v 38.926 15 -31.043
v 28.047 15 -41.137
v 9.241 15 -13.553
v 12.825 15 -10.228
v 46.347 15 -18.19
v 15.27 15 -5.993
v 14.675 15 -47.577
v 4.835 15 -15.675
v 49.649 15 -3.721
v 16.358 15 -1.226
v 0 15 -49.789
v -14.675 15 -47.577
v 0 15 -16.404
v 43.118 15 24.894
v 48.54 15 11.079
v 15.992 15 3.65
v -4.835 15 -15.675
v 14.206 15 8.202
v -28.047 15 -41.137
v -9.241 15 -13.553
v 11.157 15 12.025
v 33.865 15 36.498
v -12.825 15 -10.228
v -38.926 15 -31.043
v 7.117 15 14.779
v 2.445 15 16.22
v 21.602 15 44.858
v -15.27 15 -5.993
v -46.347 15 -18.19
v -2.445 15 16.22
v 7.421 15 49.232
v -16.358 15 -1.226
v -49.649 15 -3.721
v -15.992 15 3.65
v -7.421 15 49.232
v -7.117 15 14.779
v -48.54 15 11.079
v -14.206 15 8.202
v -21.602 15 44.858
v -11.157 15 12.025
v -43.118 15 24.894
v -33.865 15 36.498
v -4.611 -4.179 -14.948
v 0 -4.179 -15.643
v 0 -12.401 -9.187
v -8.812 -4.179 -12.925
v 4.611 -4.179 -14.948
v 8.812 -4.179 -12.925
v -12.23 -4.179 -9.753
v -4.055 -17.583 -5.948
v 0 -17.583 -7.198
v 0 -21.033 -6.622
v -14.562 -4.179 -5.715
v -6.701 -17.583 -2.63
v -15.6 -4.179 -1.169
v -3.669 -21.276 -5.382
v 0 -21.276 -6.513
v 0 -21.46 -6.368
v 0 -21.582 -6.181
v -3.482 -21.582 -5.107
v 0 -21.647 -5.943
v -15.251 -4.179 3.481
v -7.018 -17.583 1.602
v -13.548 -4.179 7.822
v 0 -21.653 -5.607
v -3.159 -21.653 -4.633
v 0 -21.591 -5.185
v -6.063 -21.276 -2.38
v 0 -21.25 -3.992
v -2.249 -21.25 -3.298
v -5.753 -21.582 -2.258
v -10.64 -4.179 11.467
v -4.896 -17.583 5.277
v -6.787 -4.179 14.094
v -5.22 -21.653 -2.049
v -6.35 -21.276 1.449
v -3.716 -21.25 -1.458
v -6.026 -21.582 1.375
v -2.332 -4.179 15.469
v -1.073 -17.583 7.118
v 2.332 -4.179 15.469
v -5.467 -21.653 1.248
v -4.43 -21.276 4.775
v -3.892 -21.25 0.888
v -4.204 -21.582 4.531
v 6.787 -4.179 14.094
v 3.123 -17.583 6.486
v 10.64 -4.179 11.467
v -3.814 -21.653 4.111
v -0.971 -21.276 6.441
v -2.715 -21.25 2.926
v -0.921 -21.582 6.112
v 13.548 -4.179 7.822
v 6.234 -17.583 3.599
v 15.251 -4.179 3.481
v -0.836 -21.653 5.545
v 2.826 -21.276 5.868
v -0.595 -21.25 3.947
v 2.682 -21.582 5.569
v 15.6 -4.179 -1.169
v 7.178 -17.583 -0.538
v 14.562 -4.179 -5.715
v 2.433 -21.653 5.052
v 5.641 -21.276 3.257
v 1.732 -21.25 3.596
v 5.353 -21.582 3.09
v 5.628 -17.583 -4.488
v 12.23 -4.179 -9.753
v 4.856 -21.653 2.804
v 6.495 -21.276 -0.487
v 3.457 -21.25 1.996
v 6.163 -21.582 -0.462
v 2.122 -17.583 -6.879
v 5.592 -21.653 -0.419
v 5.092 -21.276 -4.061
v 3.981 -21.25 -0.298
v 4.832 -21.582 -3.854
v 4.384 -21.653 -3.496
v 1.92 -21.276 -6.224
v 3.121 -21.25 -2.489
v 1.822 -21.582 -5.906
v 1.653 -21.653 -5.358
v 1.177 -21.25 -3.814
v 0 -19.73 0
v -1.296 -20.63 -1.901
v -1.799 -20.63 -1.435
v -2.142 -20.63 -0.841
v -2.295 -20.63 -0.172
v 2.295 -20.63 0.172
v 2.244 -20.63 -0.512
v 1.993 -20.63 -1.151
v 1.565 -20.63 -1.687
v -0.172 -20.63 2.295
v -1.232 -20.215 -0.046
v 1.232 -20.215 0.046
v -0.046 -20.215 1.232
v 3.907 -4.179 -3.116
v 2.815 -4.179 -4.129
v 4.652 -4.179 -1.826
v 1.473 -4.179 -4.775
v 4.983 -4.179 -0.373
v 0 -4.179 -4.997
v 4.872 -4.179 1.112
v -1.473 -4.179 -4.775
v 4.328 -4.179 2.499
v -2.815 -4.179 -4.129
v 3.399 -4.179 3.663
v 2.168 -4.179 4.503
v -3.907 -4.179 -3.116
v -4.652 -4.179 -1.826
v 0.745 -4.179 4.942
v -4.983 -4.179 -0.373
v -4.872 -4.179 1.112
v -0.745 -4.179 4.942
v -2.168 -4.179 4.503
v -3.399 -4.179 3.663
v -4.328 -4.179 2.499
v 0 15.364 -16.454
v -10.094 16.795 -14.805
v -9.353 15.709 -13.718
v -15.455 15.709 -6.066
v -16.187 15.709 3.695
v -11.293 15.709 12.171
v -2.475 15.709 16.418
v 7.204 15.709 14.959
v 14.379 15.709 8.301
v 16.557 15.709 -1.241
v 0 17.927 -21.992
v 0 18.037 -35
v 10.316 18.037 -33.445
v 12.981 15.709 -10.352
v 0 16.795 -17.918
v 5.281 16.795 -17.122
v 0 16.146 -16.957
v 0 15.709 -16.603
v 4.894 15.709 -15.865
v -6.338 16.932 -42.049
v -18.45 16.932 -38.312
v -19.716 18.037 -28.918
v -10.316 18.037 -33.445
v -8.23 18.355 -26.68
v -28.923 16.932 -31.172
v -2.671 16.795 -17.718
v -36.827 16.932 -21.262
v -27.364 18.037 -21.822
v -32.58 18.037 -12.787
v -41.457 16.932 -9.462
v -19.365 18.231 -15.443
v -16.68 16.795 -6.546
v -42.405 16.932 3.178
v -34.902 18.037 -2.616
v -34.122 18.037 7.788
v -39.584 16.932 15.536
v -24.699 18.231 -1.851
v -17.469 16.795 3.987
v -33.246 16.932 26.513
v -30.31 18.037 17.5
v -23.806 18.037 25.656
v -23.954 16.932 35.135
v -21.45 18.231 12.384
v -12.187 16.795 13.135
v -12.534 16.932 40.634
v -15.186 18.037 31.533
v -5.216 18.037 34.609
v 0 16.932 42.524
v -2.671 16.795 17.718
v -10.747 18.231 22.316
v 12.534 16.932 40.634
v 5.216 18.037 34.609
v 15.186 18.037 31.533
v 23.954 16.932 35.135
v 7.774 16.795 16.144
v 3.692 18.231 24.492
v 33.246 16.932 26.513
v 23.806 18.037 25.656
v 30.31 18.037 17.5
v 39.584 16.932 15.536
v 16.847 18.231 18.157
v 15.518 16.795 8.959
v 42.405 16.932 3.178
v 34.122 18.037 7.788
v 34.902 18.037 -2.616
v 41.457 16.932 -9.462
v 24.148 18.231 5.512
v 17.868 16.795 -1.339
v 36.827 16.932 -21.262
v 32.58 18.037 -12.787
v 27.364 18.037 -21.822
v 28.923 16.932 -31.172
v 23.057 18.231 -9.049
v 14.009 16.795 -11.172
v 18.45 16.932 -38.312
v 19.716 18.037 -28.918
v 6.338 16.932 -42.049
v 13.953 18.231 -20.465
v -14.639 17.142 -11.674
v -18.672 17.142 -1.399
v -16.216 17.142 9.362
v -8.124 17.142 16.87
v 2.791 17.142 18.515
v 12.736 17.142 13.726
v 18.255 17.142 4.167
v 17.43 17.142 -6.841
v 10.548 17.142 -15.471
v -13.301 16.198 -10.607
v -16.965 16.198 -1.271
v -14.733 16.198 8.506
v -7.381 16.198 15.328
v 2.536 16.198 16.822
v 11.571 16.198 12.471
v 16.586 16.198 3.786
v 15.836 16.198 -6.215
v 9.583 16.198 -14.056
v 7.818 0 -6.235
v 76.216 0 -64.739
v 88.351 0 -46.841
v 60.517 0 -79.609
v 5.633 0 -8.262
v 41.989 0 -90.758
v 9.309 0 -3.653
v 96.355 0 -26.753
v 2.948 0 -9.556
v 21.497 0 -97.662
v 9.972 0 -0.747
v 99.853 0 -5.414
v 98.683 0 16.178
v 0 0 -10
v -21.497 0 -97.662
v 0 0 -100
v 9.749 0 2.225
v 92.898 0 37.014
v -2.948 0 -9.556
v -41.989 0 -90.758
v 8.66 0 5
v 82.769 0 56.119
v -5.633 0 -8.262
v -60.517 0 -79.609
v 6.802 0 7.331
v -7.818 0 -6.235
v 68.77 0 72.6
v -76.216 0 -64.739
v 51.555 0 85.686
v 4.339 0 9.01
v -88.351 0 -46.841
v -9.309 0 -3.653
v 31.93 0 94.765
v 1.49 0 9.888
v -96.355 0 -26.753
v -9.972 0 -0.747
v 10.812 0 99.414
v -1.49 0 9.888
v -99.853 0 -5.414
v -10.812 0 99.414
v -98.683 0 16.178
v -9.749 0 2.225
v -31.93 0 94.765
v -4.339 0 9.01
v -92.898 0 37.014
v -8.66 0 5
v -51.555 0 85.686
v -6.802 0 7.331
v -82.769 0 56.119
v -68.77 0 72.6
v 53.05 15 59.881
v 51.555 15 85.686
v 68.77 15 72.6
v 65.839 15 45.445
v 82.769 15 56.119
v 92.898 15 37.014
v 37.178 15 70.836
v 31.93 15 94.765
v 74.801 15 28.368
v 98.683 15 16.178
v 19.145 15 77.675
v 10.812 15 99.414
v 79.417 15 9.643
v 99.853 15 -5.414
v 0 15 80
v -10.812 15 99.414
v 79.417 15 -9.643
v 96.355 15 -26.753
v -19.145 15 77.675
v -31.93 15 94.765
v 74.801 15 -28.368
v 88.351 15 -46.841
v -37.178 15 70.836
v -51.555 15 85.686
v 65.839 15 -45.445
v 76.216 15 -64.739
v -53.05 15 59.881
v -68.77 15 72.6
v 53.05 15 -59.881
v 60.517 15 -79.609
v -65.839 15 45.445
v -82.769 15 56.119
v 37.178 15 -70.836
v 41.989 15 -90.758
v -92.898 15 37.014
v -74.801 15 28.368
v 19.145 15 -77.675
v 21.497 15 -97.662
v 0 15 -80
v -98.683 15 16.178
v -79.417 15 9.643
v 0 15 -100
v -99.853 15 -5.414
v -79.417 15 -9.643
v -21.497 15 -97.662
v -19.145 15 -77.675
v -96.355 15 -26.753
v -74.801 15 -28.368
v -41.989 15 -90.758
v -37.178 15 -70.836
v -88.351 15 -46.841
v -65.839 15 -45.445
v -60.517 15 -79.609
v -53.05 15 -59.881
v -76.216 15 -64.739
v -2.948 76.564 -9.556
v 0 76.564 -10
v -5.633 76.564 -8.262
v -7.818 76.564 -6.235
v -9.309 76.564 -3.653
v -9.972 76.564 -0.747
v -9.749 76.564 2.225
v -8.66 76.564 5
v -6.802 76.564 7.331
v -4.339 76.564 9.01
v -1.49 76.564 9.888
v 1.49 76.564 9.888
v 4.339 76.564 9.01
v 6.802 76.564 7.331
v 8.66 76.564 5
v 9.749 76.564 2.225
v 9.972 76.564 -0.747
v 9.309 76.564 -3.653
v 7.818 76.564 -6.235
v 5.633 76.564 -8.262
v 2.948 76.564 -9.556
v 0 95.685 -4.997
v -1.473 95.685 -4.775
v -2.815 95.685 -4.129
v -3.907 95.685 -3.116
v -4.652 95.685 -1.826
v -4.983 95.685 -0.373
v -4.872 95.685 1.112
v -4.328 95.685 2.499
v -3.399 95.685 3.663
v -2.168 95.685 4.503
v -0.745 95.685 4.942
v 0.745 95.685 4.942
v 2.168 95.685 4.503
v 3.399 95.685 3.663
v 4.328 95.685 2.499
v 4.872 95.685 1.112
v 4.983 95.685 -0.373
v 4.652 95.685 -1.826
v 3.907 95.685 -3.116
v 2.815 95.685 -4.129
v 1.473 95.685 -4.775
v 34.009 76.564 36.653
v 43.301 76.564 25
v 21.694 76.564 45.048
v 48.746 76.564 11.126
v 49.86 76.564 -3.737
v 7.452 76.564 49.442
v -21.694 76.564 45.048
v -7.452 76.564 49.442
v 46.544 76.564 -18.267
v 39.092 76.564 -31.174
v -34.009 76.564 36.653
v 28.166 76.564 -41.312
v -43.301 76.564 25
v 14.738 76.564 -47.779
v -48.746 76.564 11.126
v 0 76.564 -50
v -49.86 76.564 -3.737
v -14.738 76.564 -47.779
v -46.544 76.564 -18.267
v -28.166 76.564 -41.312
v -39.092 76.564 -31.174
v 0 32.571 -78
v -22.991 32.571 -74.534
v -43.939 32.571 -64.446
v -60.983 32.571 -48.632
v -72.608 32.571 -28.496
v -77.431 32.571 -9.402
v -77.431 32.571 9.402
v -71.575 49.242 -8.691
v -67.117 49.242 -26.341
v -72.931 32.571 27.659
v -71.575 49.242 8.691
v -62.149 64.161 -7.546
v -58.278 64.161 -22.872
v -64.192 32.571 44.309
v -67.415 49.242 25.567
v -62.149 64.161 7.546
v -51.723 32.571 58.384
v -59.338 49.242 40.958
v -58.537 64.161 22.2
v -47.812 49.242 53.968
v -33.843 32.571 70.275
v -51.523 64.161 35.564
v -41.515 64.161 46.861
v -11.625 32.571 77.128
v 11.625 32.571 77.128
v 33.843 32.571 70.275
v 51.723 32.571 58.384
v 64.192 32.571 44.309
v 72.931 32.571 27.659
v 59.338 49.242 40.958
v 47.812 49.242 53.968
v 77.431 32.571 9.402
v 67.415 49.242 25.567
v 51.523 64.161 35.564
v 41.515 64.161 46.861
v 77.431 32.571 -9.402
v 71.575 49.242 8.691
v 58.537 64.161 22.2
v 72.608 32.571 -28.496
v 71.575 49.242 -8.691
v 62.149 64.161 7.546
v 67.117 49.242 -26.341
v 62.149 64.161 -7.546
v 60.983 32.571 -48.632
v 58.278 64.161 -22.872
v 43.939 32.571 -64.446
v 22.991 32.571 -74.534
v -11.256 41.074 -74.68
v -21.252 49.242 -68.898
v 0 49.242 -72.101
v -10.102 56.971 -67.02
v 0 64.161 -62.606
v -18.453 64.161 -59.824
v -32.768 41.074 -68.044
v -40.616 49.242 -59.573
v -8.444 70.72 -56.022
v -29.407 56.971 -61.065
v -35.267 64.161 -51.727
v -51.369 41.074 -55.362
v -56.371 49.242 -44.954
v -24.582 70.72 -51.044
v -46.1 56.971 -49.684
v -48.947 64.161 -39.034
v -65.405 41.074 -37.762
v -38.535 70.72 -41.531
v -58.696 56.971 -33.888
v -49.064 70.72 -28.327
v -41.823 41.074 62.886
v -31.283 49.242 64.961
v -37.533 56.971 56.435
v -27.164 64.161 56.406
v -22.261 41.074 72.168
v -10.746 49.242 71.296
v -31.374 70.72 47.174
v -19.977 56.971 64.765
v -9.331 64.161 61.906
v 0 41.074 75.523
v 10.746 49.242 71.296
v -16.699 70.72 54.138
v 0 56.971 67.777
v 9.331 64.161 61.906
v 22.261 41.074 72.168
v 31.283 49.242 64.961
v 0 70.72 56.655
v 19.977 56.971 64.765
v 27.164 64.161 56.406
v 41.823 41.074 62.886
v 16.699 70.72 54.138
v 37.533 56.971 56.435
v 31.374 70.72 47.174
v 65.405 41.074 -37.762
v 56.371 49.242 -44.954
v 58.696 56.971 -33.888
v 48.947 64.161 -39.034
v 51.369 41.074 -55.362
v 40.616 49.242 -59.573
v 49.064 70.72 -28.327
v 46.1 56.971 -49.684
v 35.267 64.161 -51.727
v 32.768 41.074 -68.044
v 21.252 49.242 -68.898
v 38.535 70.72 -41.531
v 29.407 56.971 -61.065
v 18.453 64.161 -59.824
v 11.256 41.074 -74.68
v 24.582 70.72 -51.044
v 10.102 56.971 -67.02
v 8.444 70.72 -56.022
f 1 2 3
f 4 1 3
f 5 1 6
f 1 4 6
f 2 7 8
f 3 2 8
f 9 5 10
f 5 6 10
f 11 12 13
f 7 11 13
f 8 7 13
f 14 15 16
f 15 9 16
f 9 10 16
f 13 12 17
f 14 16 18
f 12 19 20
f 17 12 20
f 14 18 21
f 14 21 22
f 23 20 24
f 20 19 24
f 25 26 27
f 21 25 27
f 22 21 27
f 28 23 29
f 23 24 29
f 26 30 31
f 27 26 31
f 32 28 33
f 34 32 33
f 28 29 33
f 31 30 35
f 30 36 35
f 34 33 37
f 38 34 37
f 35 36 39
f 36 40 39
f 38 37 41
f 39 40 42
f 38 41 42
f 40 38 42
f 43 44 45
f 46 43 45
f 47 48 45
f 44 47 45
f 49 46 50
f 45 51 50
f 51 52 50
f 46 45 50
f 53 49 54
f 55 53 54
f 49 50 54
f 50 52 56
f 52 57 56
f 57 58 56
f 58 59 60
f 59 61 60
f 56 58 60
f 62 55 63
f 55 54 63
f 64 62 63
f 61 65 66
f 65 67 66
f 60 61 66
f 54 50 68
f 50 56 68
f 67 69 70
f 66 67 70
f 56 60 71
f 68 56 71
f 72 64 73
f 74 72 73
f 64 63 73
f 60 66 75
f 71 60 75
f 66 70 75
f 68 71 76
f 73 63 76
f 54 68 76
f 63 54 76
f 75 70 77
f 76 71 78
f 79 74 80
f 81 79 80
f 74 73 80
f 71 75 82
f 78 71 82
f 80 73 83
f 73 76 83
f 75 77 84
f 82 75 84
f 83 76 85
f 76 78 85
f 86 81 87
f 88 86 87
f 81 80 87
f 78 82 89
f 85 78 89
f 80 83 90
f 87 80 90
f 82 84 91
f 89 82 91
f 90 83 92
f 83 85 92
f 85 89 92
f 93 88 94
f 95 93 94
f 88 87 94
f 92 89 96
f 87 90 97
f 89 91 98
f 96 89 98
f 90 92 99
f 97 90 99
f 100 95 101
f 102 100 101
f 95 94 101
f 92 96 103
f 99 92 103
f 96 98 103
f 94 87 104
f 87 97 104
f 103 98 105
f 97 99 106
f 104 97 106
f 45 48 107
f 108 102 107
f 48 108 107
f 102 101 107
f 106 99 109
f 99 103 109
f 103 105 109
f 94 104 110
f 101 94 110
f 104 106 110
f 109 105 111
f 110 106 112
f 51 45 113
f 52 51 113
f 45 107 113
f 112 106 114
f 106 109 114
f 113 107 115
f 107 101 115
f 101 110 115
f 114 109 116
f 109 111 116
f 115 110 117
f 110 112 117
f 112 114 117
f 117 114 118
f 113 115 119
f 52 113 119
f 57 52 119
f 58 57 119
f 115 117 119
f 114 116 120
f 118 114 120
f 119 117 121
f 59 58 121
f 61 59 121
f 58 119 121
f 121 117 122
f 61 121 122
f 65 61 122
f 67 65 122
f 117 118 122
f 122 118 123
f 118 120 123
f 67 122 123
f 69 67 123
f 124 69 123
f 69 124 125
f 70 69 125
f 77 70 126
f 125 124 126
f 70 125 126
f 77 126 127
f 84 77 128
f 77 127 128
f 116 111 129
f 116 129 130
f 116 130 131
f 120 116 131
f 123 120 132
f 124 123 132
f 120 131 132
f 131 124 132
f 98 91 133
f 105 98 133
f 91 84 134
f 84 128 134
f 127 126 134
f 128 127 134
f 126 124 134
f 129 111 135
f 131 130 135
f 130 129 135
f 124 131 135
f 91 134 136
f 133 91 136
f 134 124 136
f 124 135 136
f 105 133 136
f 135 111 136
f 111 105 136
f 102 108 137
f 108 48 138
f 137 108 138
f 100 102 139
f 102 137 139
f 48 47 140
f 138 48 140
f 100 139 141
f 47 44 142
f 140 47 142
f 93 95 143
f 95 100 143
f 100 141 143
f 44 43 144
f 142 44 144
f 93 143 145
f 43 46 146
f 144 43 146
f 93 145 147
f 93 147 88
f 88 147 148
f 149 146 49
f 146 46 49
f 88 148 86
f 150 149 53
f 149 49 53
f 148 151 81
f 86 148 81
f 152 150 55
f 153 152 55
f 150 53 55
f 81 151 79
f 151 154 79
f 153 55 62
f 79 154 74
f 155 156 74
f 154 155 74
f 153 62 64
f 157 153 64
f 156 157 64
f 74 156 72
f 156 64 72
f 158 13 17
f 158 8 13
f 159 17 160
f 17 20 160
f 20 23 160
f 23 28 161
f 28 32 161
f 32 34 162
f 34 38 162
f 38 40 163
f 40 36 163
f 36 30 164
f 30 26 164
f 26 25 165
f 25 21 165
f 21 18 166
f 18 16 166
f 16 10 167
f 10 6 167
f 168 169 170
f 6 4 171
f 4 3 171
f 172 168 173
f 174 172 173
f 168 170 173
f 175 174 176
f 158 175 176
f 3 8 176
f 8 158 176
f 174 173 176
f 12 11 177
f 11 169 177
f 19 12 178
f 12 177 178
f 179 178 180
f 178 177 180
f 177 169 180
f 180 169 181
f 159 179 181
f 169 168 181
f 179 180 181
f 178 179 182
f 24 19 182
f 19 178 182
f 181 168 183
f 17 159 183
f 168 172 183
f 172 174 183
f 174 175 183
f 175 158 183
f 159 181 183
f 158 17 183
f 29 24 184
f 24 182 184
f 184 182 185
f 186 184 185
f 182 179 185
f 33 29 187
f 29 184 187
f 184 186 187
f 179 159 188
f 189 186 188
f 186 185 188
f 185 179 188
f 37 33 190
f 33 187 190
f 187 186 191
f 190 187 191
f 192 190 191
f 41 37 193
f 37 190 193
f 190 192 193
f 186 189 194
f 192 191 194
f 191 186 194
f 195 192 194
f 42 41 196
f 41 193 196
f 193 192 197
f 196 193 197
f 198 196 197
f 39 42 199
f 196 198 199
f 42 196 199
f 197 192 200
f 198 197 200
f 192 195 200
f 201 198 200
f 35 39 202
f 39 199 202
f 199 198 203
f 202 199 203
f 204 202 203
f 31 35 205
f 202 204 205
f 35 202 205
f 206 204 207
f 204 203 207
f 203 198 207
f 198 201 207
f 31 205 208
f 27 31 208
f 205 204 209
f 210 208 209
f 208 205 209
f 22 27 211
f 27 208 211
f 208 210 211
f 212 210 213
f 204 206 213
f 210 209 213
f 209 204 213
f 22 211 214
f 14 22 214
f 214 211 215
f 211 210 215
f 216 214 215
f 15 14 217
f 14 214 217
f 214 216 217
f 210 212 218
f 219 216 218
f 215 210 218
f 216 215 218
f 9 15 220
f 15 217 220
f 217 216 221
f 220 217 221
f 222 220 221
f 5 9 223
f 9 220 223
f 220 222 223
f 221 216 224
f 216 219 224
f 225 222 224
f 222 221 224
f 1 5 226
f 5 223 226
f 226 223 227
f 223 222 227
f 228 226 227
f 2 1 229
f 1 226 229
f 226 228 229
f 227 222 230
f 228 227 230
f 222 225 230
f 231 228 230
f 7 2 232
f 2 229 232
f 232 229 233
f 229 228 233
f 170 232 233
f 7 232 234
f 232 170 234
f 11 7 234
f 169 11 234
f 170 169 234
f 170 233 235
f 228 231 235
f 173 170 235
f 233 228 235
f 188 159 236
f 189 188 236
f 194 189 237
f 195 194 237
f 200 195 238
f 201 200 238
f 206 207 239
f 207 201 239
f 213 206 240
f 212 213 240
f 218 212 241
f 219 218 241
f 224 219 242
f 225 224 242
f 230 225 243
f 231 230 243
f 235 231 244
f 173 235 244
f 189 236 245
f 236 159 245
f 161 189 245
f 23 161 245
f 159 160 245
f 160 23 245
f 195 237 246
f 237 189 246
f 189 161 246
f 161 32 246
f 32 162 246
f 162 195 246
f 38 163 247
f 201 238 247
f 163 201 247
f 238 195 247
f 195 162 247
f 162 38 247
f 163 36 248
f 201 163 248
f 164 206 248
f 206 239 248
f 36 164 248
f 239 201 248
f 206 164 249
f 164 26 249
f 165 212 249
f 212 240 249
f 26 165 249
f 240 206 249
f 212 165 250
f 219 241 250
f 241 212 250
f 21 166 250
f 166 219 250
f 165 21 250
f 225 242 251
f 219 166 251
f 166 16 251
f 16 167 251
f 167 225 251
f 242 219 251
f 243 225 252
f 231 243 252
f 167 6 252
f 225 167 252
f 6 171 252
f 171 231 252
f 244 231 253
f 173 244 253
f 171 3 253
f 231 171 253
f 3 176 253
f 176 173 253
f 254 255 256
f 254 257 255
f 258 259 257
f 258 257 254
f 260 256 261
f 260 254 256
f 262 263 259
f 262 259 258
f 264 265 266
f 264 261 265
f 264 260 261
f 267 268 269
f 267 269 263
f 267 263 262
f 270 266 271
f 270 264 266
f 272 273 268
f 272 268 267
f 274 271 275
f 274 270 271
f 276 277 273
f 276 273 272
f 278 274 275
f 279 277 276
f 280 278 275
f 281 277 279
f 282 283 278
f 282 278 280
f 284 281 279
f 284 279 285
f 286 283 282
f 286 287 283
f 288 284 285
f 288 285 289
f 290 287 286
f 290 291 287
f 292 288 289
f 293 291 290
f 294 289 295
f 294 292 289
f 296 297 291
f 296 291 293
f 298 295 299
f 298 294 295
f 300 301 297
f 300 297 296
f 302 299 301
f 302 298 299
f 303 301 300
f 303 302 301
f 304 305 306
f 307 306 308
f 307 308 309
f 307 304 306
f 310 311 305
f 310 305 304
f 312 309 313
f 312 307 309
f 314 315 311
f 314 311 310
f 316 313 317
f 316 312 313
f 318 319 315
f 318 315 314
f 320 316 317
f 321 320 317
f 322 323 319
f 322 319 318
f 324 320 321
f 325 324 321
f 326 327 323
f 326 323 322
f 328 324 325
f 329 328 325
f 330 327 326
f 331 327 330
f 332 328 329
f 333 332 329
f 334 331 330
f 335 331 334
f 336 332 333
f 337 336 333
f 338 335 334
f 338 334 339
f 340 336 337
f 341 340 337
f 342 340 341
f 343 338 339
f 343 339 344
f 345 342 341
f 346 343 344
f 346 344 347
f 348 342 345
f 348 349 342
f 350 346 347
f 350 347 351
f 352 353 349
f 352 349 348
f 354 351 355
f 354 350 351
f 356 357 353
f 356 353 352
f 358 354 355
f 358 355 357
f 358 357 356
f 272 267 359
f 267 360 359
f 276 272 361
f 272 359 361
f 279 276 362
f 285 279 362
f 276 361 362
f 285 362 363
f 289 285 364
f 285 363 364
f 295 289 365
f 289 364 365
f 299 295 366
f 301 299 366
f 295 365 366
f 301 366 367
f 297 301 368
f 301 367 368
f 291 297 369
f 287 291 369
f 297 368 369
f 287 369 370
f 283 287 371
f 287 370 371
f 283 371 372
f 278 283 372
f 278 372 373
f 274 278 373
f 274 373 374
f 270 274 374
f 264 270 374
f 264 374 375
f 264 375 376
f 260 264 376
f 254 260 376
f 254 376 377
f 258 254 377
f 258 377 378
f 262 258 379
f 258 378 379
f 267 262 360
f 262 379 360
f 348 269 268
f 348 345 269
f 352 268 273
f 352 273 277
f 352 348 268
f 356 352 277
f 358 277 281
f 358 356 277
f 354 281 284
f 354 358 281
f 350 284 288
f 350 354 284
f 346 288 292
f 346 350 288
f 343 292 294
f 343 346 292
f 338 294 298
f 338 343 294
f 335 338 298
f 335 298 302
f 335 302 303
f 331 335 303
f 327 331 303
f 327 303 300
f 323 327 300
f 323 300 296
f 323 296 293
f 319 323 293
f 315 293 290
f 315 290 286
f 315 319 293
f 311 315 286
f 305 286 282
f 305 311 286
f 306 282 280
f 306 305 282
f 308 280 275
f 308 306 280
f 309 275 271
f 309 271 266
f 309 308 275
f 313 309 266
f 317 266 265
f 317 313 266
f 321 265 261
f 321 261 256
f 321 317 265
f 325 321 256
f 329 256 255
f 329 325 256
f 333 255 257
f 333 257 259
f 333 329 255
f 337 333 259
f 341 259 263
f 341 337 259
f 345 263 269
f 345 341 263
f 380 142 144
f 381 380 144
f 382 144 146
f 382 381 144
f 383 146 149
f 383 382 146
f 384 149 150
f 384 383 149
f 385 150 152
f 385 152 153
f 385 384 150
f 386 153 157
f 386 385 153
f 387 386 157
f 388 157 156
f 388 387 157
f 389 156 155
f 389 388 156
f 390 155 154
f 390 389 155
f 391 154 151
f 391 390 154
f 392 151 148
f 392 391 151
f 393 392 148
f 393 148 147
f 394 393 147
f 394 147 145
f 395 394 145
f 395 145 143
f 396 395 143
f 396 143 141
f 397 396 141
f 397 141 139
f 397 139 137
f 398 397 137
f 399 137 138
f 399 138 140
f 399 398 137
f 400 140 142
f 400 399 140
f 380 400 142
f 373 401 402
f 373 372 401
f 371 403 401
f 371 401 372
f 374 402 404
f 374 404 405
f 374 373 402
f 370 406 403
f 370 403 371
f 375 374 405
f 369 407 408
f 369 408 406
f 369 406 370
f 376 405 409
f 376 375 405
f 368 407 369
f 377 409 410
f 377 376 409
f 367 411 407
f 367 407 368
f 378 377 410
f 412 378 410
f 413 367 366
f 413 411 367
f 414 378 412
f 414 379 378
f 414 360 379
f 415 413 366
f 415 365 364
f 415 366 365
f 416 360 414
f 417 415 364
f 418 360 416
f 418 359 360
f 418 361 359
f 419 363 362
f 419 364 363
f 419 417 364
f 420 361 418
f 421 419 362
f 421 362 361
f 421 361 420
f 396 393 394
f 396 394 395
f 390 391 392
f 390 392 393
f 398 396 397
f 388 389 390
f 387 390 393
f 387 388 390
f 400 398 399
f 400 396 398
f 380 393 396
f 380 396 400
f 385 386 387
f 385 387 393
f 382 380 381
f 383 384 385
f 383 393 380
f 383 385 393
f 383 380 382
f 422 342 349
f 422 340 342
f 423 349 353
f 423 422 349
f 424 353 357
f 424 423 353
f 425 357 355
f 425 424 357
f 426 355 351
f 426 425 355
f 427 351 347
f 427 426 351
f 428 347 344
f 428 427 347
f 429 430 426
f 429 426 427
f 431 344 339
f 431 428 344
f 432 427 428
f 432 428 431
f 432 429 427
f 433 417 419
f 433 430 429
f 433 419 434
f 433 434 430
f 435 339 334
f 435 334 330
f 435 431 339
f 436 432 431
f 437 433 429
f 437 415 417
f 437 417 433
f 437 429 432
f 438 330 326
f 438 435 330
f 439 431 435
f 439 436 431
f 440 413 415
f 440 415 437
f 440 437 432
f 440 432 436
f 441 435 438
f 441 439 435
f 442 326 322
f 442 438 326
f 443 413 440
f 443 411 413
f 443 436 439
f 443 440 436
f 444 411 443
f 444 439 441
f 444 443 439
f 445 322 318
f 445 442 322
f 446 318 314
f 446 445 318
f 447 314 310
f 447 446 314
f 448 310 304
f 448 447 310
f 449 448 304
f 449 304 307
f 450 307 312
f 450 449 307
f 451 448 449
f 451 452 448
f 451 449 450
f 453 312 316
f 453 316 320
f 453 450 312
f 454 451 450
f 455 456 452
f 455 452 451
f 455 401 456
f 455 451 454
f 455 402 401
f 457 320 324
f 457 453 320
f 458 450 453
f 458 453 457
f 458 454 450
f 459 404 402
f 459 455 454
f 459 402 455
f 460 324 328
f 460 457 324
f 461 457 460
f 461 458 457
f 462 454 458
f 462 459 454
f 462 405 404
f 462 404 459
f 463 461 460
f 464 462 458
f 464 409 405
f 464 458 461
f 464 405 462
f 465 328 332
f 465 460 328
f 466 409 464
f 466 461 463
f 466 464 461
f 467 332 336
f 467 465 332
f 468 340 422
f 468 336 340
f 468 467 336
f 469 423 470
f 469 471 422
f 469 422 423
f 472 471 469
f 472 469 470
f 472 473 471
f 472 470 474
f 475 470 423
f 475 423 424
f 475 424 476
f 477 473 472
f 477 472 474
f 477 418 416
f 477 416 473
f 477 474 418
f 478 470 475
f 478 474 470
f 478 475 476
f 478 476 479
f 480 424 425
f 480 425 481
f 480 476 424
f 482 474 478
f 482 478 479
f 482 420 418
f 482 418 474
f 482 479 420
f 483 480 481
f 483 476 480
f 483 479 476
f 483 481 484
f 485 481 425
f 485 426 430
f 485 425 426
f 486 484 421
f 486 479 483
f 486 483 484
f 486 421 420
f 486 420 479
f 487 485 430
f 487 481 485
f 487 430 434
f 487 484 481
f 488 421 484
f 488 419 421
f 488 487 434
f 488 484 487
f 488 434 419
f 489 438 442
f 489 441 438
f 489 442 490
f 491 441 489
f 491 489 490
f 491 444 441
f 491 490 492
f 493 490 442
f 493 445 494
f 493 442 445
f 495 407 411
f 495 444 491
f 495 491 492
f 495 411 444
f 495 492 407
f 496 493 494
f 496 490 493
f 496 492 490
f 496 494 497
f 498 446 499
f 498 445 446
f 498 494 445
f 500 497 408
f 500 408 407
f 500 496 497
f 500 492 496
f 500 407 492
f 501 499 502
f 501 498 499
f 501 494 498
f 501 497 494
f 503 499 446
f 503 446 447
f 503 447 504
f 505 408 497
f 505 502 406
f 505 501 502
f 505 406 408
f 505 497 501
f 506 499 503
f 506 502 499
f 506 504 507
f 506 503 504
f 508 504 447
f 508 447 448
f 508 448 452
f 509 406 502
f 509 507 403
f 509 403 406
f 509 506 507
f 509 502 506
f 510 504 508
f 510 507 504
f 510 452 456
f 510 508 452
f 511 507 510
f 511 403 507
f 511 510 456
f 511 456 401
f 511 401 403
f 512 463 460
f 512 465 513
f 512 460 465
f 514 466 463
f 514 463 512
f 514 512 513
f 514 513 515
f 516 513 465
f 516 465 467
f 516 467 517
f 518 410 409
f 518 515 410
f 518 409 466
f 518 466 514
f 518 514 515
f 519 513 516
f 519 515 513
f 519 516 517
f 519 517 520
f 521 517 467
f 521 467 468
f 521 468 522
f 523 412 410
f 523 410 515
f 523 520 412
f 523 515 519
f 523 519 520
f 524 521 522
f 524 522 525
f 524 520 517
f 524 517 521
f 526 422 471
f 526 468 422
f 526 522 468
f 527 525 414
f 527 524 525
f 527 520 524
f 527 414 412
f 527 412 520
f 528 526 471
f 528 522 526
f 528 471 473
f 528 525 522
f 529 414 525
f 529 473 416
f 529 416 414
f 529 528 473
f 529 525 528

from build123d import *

# Parameters (mm, degrees)
SKETCH5_W = 10
SKETCH5_H = 85.271317829
SKETCH6_W = 4.997404457
SKETCH6_H = 99.86379845


with BuildPart() as part:
    # Sketch1 → Revolve1 (revolve)
    with BuildSketch(Plane.XY, mode=Mode.PRIVATE) as revolve1_sk:
        with BuildLine():
            Line((0, 0), (-100, 0))
            Line((-100, 0), (-100, 15))
            Line((-100, 15), (-80, 15))
            ThreePointArc((-80, 15), (-72.100884338, 49.242047033), (-50, 76.563553666))
            Line((-50, 76.563553666), (0, 76.563553666))
            Line((0, 76.563553666), (0, 0))
        make_face()
    revolve(revolve1_sk.sketch.rotate(Axis((0, -54.430062581, 0), (0, 1, 0)), 270), axis=Axis((0, -54.430062581, 0), (0, 1, 0)))

    # Sketch5 → Cut-Revolve3 (revolve, cut)
    with BuildSketch(Plane.XY, mode=Mode.PRIVATE) as cut_revolve3_sk:
        with Locations((-5, 38.0233789)):
            Rectangle(SKETCH5_W, SKETCH5_H)
    revolve(cut_revolve3_sk.sketch.rotate(Axis((0, -4.612280014, 0), (0, 1, 0)), 270), axis=Axis((0, -4.612280014, 0), (0, 1, 0)), mode=Mode.SUBTRACT)

    # Sketch8 → Cut-Revolve5 (revolve, cut)
    with BuildSketch(Plane.XY, mode=Mode.PRIVATE) as cut_revolve5_sk:
        with BuildLine():
            Line((16.403662065, 15), (49.788533995, 15))
            add(Edge.make_bspline(
                [(49.788533995, 15), (35.987773119, 19.719088146), (16.403662065, 19.226251336), (16.403662065, 15)],
                knots=[0, 0, 0, 0, 1, 1, 1, 1], degree=3))
        make_face()
    revolve(cut_revolve5_sk.sketch.rotate(Axis((0, -28.203653135, 0), (0, 1, 0)), 90), axis=Axis((0, -28.203653135, 0), (0, 1, 0)), mode=Mode.SUBTRACT)


with BuildPart() as body_2:
    # Sketch6 → Revolve5 (revolve)
    with BuildSketch(Plane.XY, mode=Mode.PRIVATE) as revolve5_sk:
        with Locations((-2.498702229, 45.752792466)):
            Rectangle(SKETCH6_W, SKETCH6_H)
    revolve(revolve5_sk.sketch.rotate(Axis((0, -4.179106759, 0), (0, 1, 0)), 270), axis=Axis((0, -4.179106759, 0), (0, 1, 0)))

    # Sketch7 → Revolve7 (revolve)
    with BuildSketch(Plane.XY, mode=Mode.PRIVATE) as revolve7_sk:
        with BuildLine():
            Line((0, -4.179106759), (-15.643341922, -4.179106759))
            add(Edge.make_bspline(
                [(-15.643341922, -4.179106759), (0, -19.729897602), (-13.066129302, -24.878518685), (0, -19.729897602)],
                knots=[0, 0, 0, 0, 1, 1, 1, 1], degree=3))
            Line((0, -19.729897602), (0, -4.179106759))
        make_face()
    revolve(revolve7_sk.sketch.rotate(Axis((0, -28.203653135, 0), (0, 1, 0)), 270), axis=Axis((0, -28.203653135, 0), (0, 1, 0)))


solid = Compound([part.part, body_2.part])
